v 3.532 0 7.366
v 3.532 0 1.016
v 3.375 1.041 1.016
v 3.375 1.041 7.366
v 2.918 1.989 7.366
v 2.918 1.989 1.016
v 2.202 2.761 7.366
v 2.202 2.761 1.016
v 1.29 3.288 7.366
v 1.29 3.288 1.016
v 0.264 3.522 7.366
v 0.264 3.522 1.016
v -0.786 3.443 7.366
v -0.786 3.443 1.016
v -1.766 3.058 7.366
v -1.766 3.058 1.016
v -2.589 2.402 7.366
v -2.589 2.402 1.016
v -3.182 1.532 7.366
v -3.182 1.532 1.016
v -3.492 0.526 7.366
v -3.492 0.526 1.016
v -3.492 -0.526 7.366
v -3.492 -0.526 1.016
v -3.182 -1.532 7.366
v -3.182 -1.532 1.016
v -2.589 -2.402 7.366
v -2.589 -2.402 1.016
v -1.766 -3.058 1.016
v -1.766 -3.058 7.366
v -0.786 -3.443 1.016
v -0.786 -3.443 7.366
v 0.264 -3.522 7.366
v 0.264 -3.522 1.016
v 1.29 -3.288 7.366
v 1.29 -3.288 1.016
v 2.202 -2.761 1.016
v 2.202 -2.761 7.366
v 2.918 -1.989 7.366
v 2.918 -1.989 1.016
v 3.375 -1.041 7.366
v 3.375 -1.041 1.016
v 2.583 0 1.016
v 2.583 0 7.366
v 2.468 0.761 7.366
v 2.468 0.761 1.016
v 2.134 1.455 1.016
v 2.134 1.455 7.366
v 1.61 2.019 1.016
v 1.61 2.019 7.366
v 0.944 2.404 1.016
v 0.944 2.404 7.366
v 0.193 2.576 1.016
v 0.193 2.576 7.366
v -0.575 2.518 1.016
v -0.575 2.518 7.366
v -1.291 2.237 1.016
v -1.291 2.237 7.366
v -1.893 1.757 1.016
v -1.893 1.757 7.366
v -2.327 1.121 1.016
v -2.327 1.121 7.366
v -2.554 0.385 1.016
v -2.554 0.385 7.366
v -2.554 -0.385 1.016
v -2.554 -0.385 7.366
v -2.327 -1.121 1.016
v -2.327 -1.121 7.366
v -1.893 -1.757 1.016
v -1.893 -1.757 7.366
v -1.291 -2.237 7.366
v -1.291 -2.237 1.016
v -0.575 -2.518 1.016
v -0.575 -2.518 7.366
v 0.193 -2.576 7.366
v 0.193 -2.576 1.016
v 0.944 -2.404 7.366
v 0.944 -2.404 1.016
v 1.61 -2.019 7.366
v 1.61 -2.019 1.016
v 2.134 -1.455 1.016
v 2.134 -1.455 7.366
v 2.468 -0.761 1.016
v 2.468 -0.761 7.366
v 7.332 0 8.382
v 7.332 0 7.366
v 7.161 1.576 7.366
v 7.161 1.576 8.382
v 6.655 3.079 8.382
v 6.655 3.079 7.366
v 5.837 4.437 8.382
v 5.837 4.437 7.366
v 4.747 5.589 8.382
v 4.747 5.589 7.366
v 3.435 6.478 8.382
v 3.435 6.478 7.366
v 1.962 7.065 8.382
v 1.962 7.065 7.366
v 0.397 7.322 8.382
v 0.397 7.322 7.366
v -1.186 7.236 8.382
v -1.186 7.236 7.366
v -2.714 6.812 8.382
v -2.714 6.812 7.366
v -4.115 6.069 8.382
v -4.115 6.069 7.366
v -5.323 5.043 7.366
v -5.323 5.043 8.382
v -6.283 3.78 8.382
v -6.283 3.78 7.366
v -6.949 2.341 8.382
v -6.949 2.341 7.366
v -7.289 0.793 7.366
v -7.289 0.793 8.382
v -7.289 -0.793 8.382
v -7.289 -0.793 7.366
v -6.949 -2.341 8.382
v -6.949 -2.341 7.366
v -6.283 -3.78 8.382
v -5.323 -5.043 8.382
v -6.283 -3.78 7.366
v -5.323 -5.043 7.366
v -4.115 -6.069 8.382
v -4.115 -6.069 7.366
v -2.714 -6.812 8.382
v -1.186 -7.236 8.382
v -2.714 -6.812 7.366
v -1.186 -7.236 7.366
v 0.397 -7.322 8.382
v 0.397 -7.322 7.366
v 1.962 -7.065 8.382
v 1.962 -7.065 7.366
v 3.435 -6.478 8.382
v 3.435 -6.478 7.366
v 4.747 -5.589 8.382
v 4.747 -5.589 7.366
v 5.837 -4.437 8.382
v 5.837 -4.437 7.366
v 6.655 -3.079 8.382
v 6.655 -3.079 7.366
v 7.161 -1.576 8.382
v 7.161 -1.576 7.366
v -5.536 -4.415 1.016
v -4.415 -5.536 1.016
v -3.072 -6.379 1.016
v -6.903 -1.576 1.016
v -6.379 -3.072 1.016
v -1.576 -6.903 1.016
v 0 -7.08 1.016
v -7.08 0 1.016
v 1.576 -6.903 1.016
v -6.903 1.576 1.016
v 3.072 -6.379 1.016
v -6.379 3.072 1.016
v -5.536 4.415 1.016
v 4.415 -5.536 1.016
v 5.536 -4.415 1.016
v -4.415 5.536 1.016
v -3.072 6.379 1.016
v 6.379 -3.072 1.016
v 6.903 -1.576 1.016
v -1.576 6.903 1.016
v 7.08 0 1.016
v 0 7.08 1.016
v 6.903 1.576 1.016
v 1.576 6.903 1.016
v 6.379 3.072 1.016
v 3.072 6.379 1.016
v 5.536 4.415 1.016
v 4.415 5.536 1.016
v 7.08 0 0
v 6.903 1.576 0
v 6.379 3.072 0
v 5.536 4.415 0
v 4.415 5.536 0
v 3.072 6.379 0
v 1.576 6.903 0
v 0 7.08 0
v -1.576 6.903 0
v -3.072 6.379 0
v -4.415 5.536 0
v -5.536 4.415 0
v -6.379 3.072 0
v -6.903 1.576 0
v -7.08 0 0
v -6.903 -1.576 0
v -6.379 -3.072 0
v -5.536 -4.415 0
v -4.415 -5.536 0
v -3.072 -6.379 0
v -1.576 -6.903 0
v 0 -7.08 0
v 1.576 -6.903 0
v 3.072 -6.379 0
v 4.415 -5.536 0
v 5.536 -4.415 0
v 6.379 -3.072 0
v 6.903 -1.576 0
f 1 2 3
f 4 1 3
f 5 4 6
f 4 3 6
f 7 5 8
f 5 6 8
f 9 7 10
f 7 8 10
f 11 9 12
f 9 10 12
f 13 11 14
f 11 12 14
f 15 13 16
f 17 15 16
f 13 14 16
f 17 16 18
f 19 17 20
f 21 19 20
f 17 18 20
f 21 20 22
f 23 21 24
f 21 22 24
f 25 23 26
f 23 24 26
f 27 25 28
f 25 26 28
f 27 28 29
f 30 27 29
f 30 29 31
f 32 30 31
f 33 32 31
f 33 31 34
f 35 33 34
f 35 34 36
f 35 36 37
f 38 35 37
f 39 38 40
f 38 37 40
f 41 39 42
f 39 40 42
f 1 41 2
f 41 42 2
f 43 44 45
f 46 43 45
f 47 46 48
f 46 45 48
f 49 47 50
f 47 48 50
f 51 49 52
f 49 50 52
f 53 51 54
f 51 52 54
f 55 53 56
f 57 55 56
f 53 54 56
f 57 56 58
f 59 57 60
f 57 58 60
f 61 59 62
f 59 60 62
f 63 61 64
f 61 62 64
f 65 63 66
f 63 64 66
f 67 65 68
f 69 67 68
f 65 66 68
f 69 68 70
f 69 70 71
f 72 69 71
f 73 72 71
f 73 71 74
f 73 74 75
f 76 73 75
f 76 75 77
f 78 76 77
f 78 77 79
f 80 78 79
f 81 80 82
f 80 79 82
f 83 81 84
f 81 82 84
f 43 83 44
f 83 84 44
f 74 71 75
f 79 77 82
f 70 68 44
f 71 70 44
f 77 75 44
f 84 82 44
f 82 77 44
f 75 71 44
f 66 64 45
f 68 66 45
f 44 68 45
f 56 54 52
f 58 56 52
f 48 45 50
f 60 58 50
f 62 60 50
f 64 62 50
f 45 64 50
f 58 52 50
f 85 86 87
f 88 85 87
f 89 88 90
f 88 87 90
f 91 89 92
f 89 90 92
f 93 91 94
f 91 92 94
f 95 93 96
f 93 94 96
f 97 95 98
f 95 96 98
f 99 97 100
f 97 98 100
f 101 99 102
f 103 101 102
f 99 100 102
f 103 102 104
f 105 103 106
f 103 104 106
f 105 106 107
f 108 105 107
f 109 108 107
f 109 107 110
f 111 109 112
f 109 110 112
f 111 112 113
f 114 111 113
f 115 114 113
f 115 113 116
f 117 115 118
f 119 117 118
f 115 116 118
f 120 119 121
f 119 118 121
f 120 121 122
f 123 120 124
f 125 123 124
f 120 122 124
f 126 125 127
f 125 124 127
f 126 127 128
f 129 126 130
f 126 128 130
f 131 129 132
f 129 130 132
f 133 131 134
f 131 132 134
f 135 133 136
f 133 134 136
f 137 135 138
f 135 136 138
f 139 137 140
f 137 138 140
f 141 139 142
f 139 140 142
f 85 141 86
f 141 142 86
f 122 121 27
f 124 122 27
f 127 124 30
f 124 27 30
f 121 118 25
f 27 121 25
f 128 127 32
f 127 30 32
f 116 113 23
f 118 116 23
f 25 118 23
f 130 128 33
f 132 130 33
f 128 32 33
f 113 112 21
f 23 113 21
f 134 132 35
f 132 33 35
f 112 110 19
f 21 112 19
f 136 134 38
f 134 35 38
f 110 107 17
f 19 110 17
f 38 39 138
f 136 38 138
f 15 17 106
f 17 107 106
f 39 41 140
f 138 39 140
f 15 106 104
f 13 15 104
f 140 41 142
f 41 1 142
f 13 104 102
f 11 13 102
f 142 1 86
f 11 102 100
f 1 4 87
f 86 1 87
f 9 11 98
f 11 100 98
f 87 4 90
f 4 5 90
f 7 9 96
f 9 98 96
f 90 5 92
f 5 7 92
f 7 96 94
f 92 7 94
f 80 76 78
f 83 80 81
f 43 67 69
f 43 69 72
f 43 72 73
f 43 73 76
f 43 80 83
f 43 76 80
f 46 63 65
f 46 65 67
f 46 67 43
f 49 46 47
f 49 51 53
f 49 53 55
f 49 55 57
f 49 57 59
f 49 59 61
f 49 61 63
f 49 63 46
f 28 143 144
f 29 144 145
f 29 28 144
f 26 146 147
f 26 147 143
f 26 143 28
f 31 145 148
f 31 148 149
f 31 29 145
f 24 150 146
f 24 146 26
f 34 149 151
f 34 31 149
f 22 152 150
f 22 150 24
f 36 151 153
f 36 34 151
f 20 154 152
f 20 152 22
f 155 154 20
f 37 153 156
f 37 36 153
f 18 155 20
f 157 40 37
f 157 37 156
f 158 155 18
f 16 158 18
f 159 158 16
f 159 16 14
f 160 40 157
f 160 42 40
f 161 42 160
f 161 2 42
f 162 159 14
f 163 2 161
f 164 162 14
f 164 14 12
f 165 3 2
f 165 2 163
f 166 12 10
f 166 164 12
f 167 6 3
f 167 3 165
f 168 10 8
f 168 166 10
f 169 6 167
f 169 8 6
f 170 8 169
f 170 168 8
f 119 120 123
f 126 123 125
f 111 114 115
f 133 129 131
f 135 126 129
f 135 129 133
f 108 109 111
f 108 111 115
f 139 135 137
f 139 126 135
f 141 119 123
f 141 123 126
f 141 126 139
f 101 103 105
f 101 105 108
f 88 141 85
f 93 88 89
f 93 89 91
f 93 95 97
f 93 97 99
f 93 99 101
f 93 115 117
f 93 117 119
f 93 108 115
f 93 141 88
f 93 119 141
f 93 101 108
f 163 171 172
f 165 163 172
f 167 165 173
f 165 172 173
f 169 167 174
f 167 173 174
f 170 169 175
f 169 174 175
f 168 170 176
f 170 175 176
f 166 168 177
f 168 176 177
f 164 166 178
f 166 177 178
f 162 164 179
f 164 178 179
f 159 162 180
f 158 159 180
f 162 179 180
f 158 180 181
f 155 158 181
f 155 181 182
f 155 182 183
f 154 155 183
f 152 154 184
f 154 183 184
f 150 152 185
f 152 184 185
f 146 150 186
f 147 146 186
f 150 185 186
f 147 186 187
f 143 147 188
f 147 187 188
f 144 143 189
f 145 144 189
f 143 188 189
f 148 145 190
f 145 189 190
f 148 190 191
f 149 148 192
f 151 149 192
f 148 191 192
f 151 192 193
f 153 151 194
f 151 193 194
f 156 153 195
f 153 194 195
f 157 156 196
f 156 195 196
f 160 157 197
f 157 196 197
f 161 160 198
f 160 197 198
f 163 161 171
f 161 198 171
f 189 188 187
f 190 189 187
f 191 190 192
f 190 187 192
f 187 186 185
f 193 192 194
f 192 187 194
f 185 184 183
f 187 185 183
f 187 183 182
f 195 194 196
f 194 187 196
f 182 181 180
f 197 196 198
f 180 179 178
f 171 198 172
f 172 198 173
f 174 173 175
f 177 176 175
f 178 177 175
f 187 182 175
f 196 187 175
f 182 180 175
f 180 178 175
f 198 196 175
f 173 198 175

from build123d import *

# Parameters (mm, degrees)
F0_R     = 7.080456
F1_DEPTH = 1.016
F2_R     = 3.531639
F3_DEPTH = 6.35
F4_R     = 2.582772
F5_DEPTH = 6.35
F6_R     = 7.332478
F7_DEPTH = 1.016


with BuildPart() as f1:
    # F0 (on Top) → F1 (new body)
    with BuildSketch(Plane.XY):
        Circle(F0_R)
    extrude(amount=F1_DEPTH)

    # F2 (on face) → F3 (join)
    with BuildSketch(Plane.XY.offset(1.016)):
        Circle(F2_R)
    extrude(amount=F3_DEPTH)

    # F4 (on face) → F5 (cut)
    with BuildSketch(Plane.XY.offset(7.366)):
        Circle(F4_R)
    extrude(amount=-F5_DEPTH, mode=Mode.SUBTRACT)

    # F6 (on face) → F7 (join)
    with BuildSketch(Plane.XY.offset(7.366)):
        Circle(F6_R)
    extrude(amount=F7_DEPTH)


solid = f1.part
